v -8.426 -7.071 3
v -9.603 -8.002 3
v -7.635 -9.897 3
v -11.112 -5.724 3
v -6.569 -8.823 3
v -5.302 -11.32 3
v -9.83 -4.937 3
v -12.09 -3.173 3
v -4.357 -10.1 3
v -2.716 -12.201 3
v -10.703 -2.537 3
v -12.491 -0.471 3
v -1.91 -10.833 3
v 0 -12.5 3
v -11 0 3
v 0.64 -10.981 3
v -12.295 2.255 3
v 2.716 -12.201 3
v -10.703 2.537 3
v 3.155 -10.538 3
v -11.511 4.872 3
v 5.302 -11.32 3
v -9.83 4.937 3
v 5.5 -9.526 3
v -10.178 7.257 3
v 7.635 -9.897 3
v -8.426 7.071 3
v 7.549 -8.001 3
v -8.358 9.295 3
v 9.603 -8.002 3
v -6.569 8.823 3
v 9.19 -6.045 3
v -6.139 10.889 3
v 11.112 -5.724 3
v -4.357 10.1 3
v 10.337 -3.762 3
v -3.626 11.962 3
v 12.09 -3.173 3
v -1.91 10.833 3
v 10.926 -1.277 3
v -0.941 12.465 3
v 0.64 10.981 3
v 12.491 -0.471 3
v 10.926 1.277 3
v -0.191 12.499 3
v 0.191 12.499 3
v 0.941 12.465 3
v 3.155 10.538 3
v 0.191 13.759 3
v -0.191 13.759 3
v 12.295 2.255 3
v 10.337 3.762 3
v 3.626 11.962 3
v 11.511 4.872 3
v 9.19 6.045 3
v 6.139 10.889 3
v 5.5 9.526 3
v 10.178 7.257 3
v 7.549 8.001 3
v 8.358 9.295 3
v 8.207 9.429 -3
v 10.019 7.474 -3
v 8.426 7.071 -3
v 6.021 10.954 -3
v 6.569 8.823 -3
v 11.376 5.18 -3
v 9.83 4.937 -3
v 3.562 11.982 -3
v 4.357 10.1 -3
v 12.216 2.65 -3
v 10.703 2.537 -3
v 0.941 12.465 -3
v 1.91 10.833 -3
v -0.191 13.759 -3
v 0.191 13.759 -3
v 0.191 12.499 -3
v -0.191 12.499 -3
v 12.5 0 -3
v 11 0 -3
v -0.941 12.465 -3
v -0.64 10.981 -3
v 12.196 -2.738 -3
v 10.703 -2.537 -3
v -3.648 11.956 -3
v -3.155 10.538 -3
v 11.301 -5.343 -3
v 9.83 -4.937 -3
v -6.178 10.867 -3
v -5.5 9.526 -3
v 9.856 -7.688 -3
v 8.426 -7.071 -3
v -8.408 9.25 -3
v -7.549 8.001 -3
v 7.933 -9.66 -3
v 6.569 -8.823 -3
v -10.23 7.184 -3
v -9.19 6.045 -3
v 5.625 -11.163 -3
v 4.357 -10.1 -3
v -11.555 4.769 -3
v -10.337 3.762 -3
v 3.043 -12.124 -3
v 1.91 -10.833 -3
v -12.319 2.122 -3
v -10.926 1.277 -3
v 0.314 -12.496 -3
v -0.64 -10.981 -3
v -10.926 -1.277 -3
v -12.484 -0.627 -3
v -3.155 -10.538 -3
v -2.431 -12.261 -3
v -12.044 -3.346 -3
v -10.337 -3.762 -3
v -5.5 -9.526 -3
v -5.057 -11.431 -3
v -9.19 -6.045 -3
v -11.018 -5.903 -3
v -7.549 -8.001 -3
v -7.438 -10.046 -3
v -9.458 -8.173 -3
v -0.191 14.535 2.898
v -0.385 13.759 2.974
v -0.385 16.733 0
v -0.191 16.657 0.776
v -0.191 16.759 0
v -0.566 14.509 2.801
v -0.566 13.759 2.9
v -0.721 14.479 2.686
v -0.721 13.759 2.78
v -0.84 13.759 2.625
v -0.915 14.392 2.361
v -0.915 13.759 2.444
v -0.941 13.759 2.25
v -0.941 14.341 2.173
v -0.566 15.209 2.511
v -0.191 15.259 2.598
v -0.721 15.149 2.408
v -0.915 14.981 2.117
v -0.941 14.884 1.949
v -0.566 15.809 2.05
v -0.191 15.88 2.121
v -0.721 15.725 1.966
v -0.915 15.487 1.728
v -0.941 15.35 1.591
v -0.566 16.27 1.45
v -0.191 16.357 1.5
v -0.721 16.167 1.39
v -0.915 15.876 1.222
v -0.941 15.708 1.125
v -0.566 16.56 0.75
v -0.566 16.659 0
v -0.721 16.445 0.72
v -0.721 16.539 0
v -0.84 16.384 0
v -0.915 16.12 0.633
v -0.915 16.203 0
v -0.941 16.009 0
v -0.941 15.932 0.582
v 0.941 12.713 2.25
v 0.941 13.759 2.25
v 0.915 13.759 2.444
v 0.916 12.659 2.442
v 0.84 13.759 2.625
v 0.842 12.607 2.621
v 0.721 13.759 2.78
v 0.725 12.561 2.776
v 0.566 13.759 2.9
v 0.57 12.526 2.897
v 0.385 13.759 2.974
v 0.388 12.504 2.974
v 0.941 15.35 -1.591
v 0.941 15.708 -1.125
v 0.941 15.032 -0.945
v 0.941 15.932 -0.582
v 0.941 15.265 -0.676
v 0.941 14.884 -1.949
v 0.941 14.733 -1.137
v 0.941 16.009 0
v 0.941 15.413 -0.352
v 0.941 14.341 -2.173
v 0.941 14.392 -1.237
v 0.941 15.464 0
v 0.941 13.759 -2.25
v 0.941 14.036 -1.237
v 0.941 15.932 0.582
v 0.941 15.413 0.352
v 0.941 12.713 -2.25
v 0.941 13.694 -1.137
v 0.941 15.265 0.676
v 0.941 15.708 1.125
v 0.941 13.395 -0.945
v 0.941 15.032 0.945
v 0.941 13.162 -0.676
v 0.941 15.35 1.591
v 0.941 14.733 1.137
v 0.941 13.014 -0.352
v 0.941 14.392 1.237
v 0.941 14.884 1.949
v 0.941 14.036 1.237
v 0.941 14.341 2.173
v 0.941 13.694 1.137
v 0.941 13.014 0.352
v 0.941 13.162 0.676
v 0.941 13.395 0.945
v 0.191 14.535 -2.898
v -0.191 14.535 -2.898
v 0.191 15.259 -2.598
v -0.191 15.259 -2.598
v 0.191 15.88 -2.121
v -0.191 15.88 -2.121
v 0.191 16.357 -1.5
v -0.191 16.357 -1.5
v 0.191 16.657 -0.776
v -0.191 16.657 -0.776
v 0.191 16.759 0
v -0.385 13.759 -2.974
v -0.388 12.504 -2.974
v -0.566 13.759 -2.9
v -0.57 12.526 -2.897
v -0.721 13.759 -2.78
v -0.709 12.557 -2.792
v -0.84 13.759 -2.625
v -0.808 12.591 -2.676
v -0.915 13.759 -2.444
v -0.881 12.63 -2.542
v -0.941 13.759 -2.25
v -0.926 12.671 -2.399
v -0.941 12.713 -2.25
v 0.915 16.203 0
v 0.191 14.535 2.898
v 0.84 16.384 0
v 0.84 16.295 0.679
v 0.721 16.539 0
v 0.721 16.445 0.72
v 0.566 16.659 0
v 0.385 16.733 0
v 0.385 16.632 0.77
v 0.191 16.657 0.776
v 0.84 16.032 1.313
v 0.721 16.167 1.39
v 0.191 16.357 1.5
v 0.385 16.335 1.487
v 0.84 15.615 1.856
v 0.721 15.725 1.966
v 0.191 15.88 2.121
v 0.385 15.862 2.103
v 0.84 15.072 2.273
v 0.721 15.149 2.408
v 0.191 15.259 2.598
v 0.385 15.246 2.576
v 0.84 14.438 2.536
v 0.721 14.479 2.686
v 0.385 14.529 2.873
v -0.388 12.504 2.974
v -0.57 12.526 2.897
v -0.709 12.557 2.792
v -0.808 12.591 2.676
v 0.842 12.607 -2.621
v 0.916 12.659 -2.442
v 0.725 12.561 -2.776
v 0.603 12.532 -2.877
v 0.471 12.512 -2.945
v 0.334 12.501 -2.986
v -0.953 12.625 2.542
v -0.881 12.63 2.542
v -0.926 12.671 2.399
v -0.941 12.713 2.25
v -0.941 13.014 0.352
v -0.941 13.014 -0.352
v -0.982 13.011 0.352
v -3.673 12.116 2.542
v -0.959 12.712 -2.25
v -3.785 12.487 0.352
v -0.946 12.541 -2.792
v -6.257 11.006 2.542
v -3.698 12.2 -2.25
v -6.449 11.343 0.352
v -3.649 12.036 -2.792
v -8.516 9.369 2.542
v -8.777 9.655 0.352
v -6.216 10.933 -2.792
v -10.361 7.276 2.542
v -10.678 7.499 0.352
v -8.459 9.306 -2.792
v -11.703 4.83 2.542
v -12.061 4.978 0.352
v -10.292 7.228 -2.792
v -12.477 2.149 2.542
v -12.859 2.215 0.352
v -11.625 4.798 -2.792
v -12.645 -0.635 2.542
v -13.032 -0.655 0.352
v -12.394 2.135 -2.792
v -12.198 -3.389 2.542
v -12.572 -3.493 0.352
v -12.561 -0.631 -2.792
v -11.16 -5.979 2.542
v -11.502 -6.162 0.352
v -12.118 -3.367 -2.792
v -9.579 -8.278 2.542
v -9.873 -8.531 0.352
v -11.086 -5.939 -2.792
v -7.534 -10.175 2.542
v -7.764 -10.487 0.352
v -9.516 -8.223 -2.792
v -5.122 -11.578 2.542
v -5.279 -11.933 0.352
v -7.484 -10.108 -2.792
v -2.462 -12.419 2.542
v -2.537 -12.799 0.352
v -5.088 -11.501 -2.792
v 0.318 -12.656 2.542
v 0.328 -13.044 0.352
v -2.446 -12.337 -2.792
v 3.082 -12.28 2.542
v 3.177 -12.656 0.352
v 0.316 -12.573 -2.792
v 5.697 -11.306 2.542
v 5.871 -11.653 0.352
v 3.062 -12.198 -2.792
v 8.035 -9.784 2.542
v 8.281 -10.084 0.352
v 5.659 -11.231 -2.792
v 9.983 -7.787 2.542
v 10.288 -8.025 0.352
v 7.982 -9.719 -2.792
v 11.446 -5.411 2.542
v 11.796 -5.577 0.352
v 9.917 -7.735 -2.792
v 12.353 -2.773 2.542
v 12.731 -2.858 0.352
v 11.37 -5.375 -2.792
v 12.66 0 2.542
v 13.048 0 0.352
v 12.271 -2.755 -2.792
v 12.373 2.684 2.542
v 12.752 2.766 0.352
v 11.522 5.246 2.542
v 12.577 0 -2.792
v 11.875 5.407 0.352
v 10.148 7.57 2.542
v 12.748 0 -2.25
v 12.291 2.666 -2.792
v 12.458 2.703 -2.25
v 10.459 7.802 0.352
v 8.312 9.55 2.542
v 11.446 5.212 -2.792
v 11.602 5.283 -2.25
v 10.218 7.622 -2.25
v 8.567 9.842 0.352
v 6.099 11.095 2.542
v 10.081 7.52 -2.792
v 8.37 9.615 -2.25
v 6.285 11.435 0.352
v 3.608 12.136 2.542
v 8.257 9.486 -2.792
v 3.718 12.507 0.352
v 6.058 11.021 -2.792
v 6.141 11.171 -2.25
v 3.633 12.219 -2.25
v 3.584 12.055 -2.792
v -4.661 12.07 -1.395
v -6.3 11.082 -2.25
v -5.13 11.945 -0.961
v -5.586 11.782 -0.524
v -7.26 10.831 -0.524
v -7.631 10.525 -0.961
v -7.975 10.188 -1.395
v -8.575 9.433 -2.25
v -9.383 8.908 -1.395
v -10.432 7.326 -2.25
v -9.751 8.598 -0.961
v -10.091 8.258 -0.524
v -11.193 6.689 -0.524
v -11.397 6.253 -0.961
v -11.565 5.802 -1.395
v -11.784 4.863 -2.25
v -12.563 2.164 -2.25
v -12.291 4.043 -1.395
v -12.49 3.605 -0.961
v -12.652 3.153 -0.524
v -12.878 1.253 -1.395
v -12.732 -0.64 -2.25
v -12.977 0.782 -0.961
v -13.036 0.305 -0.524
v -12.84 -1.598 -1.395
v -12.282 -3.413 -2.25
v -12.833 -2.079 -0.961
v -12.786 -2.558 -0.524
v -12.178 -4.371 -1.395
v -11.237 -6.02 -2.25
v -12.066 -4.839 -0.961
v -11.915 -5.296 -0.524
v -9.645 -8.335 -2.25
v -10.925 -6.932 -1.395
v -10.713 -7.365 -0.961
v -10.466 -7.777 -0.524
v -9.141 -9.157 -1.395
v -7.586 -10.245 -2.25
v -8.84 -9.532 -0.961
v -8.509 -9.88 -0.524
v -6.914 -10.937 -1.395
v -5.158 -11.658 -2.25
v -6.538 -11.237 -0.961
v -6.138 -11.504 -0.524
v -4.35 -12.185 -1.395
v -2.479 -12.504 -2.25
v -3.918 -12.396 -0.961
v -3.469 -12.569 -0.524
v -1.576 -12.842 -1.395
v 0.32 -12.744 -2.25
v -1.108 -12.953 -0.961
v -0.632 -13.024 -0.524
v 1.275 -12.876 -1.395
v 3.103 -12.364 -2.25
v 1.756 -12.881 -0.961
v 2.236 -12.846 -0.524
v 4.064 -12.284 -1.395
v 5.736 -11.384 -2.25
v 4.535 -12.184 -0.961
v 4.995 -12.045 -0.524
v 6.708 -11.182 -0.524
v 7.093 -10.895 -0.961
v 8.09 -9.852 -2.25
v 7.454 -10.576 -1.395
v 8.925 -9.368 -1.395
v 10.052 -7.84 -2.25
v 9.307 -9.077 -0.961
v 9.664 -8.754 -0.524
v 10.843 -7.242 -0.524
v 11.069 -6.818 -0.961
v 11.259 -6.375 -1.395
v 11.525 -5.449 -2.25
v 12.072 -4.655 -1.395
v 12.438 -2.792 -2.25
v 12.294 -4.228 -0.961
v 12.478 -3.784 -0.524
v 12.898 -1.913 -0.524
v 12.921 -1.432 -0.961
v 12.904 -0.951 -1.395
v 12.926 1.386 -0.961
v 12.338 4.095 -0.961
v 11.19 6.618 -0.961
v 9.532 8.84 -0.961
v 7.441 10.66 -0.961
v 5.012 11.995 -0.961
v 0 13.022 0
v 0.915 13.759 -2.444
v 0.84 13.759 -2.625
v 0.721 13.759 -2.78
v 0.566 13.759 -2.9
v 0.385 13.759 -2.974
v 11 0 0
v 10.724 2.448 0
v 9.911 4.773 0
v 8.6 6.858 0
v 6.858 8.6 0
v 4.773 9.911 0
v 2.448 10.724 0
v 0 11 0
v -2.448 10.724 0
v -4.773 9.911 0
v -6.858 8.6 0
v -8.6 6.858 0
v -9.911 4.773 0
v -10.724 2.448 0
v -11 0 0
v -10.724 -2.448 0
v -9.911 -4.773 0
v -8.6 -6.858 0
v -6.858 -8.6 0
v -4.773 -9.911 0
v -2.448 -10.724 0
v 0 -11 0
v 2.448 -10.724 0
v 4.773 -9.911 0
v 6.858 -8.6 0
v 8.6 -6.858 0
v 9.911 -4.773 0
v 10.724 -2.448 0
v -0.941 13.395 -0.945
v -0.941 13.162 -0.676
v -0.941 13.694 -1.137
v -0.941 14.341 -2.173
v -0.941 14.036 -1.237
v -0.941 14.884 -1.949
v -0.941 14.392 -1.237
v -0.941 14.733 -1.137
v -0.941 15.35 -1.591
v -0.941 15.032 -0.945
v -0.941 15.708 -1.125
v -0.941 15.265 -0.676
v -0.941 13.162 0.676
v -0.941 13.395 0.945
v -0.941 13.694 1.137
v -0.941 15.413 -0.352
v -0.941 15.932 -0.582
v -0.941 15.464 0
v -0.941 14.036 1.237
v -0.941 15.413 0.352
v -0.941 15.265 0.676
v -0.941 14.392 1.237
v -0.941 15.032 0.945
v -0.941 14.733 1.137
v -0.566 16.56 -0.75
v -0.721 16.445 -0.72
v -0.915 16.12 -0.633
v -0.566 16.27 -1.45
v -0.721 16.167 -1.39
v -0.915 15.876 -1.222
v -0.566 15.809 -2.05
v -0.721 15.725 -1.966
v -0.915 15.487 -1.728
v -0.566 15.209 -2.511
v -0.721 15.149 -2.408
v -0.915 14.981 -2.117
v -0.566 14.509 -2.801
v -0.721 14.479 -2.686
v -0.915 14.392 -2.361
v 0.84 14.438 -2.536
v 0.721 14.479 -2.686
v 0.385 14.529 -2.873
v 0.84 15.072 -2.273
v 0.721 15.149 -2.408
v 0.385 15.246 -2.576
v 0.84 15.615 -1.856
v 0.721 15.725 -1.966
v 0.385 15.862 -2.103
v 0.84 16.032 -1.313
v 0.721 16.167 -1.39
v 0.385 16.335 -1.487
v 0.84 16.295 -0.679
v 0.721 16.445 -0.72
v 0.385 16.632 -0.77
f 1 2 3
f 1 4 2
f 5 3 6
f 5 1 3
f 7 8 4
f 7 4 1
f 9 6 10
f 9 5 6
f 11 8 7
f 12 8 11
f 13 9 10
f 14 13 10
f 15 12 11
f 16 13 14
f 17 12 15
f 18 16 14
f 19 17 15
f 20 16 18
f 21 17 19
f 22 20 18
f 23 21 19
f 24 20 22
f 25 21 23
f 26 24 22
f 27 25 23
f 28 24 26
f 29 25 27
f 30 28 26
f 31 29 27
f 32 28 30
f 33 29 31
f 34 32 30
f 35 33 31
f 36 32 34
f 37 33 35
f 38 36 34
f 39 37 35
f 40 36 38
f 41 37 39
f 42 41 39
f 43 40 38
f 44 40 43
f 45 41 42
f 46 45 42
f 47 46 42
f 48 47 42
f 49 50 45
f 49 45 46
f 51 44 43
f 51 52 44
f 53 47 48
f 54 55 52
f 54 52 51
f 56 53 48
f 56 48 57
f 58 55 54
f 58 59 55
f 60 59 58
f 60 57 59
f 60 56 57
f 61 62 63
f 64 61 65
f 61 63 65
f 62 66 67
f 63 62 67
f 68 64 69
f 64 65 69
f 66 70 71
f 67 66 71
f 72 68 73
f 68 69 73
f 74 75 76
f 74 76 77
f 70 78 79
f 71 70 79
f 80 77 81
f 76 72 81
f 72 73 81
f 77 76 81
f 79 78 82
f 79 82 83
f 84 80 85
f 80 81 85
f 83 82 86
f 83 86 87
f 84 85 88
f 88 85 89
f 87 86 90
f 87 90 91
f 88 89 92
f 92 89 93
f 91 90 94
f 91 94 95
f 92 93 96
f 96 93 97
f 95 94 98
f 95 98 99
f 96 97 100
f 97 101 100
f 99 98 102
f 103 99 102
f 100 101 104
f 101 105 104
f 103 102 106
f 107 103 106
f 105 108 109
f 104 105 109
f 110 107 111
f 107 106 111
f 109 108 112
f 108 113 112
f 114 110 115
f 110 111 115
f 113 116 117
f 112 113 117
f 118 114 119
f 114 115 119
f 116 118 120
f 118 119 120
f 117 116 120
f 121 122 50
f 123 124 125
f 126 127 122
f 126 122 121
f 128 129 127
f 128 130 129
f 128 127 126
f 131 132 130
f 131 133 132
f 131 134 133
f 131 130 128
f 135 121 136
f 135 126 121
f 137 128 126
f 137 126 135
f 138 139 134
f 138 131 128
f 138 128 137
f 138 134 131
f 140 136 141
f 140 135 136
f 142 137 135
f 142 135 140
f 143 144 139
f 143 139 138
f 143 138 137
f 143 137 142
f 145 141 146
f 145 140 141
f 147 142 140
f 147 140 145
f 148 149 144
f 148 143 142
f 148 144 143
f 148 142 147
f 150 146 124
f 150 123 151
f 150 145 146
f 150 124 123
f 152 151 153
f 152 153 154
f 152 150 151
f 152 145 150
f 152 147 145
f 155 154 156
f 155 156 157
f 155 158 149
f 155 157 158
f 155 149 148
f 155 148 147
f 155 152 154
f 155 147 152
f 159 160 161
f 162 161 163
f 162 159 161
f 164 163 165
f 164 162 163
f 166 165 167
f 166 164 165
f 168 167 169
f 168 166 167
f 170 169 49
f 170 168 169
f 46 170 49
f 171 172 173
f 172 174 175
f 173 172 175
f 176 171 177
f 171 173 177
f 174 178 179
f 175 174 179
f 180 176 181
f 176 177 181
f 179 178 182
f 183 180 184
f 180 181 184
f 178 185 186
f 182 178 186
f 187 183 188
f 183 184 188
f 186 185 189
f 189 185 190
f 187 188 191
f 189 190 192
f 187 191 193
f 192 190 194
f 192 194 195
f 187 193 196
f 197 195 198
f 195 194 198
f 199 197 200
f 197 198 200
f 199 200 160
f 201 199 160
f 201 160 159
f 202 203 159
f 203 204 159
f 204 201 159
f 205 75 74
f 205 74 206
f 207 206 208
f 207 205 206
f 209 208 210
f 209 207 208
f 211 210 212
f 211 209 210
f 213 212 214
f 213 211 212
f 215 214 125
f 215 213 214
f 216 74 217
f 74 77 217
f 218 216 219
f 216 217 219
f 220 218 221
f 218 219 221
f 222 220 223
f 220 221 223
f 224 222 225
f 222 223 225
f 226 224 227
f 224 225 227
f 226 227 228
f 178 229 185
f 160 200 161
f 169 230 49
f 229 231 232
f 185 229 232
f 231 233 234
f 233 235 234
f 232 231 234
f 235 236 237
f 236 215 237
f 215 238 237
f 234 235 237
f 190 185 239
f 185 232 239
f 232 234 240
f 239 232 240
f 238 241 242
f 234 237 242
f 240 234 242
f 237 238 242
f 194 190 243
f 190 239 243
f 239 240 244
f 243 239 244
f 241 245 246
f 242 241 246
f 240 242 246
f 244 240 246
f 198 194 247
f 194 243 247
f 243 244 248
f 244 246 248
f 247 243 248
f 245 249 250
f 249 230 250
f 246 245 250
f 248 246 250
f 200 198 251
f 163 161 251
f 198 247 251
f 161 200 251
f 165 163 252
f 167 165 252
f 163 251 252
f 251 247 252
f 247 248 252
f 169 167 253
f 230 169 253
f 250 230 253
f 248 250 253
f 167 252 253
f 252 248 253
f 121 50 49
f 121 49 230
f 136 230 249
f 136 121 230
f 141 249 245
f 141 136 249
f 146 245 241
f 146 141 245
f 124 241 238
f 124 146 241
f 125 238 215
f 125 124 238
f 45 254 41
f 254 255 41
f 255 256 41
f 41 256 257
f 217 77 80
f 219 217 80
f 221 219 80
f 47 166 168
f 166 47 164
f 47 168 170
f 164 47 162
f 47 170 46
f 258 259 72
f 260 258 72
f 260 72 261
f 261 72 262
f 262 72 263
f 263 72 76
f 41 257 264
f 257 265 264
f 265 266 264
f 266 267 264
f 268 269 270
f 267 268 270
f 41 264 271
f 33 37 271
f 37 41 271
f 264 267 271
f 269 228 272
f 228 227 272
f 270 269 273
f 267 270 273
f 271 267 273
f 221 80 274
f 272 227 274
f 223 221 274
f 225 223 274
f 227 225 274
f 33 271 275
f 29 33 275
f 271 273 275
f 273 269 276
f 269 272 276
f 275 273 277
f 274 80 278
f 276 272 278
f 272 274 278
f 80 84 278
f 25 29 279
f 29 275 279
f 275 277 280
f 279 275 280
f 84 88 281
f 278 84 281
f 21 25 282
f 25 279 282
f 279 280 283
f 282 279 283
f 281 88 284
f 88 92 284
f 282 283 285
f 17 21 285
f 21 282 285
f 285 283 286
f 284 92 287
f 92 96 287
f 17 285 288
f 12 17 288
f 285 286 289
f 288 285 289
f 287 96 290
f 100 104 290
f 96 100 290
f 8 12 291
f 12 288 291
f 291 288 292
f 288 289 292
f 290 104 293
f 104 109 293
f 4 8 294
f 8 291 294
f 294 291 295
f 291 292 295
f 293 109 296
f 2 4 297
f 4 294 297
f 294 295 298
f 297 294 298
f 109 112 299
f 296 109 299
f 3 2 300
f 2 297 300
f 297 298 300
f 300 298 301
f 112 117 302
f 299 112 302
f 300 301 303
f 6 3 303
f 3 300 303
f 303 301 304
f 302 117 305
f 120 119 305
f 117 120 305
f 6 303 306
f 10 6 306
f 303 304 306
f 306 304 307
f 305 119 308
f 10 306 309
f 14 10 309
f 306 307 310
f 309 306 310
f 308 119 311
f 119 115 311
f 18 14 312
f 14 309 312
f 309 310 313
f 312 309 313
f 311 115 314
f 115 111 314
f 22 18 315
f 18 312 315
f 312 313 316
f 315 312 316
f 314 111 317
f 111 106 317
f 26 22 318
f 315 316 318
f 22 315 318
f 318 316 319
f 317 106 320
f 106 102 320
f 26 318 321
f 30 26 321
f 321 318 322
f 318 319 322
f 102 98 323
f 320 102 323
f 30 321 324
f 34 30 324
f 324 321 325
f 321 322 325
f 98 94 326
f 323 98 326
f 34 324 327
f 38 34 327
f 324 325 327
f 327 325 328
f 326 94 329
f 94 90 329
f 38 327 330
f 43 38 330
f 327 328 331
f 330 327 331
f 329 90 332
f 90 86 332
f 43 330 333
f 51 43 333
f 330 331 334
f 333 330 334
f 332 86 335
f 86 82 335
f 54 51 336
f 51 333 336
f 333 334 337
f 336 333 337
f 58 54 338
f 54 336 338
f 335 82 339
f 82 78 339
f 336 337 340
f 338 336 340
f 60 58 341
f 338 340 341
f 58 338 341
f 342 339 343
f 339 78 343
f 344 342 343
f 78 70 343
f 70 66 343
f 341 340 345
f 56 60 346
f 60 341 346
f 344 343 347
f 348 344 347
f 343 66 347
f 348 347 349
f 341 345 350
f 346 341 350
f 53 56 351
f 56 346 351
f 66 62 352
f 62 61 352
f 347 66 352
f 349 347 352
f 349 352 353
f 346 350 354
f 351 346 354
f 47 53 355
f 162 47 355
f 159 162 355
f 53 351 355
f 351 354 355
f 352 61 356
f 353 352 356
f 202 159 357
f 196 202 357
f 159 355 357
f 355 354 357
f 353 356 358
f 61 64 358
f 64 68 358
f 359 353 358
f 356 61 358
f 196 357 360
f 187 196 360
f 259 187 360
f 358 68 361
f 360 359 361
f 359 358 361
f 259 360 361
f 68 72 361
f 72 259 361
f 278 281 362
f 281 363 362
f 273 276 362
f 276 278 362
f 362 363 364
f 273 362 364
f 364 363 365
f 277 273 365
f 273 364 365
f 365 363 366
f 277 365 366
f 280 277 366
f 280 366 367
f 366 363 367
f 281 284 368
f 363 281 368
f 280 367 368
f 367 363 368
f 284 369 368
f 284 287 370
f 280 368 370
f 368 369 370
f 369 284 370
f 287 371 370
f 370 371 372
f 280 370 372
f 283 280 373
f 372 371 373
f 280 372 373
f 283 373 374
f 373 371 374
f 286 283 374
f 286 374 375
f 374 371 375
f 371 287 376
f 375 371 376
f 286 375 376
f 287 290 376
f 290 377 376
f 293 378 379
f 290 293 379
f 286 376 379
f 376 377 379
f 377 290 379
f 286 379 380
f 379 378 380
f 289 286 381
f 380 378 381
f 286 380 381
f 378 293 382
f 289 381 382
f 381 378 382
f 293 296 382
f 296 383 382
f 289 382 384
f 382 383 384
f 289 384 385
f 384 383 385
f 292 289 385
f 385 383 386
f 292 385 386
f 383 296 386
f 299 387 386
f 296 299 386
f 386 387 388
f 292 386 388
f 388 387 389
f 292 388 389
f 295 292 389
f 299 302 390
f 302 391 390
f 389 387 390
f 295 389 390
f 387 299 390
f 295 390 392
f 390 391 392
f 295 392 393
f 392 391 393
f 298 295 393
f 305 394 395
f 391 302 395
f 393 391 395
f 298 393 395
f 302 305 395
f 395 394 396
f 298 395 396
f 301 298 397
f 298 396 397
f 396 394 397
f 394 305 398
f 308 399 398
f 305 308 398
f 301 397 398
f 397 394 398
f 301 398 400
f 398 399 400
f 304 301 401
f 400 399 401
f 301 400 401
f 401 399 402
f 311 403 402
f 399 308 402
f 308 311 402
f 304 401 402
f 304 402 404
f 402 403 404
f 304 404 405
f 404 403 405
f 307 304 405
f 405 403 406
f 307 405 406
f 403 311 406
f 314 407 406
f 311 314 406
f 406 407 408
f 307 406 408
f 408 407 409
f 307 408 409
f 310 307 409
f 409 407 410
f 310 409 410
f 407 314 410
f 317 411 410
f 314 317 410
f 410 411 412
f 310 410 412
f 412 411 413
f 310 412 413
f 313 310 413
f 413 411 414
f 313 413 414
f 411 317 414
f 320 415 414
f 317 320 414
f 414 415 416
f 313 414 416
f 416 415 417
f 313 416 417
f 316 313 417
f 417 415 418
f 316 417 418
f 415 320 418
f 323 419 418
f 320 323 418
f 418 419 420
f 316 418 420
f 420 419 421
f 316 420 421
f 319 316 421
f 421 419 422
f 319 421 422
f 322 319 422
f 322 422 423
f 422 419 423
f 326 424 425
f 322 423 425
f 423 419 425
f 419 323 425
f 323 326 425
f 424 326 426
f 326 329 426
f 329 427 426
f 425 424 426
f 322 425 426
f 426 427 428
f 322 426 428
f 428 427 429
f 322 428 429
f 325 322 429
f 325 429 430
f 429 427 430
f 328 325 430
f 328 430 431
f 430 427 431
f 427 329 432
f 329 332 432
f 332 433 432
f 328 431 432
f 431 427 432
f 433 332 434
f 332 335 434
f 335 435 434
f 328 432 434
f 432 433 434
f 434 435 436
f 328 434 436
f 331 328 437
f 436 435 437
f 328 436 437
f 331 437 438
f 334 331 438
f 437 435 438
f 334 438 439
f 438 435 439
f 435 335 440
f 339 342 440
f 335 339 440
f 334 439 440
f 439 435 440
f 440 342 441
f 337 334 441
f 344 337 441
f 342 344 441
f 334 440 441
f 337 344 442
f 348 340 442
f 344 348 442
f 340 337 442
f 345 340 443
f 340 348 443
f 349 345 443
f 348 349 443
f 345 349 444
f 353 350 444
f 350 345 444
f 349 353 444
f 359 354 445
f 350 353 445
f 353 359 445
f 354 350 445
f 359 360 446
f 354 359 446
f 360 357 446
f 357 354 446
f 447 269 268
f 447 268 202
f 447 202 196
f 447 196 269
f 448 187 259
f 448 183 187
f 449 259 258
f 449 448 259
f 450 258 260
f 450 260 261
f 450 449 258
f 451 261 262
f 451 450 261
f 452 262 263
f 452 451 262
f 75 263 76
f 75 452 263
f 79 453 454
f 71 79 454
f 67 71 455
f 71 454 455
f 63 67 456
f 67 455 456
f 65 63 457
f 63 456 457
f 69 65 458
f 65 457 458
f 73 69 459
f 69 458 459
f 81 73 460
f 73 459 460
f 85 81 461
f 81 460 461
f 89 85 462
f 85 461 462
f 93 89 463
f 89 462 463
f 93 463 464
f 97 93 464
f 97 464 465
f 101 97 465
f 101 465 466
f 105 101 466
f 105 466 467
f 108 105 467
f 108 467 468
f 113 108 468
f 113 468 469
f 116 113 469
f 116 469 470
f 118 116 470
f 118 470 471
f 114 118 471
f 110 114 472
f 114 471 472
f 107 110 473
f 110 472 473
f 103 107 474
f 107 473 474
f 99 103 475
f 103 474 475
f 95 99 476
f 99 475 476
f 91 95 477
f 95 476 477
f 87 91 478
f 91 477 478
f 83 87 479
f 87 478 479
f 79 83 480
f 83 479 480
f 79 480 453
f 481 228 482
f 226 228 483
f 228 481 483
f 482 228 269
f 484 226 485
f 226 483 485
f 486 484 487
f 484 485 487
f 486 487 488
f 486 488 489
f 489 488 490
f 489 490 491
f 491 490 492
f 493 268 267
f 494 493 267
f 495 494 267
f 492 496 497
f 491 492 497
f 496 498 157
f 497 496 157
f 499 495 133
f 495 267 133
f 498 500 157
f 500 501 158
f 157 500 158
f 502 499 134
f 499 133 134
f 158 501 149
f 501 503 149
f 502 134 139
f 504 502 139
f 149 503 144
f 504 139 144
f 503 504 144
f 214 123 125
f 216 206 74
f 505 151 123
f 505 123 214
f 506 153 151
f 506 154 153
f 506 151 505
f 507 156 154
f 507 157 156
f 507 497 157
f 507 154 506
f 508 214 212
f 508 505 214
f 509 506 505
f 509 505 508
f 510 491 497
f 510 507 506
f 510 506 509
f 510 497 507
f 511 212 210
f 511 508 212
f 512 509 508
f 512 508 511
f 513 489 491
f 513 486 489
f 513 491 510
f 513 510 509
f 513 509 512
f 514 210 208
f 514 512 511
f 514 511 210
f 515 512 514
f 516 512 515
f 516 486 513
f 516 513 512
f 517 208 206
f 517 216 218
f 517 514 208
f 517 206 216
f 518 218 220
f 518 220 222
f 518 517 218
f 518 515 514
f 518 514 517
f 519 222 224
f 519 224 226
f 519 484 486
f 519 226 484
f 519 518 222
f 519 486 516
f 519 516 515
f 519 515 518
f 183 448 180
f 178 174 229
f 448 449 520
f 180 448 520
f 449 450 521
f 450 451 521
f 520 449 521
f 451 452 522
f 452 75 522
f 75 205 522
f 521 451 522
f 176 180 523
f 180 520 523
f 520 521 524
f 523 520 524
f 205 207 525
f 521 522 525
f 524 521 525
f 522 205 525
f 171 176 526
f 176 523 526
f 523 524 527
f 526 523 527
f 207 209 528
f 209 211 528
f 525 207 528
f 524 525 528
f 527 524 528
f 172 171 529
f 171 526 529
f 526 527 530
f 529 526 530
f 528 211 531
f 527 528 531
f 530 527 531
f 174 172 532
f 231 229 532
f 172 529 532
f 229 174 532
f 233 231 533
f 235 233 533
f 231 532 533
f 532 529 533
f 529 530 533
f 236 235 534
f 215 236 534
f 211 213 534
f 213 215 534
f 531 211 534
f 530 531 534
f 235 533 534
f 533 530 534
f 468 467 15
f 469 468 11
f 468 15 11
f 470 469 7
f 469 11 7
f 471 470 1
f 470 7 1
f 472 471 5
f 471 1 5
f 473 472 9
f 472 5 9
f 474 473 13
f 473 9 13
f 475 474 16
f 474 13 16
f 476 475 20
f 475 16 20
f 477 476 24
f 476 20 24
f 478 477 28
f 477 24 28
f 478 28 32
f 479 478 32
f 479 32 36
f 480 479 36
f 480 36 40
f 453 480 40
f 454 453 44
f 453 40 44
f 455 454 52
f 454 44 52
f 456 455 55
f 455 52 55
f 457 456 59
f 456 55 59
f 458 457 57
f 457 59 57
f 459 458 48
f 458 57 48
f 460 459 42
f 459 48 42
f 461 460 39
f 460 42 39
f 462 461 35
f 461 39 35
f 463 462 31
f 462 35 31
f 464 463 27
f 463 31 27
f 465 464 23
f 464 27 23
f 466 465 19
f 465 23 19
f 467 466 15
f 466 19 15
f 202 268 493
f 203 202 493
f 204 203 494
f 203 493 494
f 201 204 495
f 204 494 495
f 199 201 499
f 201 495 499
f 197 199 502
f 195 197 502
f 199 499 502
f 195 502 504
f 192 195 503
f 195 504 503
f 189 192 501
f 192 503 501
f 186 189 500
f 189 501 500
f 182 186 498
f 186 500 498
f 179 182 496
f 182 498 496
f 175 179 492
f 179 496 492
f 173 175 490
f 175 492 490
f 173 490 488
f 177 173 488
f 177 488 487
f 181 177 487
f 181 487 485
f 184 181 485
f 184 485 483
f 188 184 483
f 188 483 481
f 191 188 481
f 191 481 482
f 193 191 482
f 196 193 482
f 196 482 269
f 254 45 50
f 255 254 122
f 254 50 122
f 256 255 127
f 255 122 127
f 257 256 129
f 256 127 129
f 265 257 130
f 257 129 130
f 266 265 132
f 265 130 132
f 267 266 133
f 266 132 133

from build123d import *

# Parameters (mm, degrees)
F3_DEPTH  = 3
F4_DEPTH  = 3
F5_R      = 2.99999
F6_R      = 0.75
F8_DEPTH  = 2
F9_R      = 11
F10_DEPTH = 25


# Not quite as in the source:
# - a fillet or chamfer is up to 0.001 mm smaller than in the source, because OpenCascade refuses the exact size


with BuildPart() as f1:
    # F0 (on Front) → F1 (revolve)
    with BuildSketch(Plane.XZ):
        with BuildLine():
            Line((-11, 0), (-11, 3))
            Line((-11, 3), (-12.5, 3))
            ThreePointArc((-12.5, 3), (-13.0556042785, 0), (-12.5, -3))
            Line((-12.5, -3), (-11, -3))
            Line((-11, -3), (-11, 0))
        make_face()
    revolve(axis=Axis((0, 0, 1.9247694872), (0, 0, 1)))

    # F2 (on Top) → F3 (join)
    with BuildSketch(Plane.XY):
        with BuildLine():
            Line((0.9405623698, 12.4645634672), (0.9405623698, 16.7590089038))
            Line((0.9405623698, 16.7590089038), (-0.9405623698, 16.7590089038))
            Line((-0.9405623698, 16.7590089038), (-0.9405623698, 12.4645634672))
            ThreePointArc((-0.9405623698, 12.4645634672), (0, 12.5), (0.9405623698, 12.4645634672))
        make_face()
    extrude(amount=F3_DEPTH)

    # F3_face (on face) + F2 (on Top) → F4 (join)
    with BuildSketch(Plane(origin=(0, 14.9016416929, 0), x_dir=(1, 0, 0), z_dir=(0, 0, -1))):
        with BuildLine():
            add(Edge.make_bspline(
                [(-0.9405623698, 1.8799618663), (-0.4710967186, 1.8460521303), (0, 1.8347096394), (0.4710967186, 1.8460521303), (0.9405623698, 1.8799618663)],
                knots=[0, 0, 0, 0, 0, 1, 1, 1, 1, 1], degree=4))
            Line((-0.9405623698, 1.8799618663), (-0.9405623698, -1.8573672109))
            Line((-0.9405623698, -1.8573672109), (0.9405623698, -1.8573672109))
            Line((0.9405623698, -1.8573672109), (0.9405623698, 1.8799618663))
        make_face()
    with BuildSketch(Plane.XY):
        with BuildLine():
            Line((0.9405623698, 12.4645634672), (0.9405623698, 16.7590089038))
            Line((0.9405623698, 16.7590089038), (-0.9405623698, 16.7590089038))
            Line((-0.9405623698, 16.7590089038), (-0.9405623698, 12.4645634672))
            ThreePointArc((-0.9405623698, 12.4645634672), (0, 12.5), (0.9405623698, 12.4645634672))
        make_face()
        with BuildLine():
            ThreePointArc((12.5, 0), (9.1653431366, 8.4997932439), (0.9405623698, 12.4645634672))
            ThreePointArc((0.9405623698, 12.4645634672), (0, 12.5), (-0.9405623698, 12.4645634672))
            ThreePointArc((-0.9405623698, 12.4645634672), (-8.4997932439, -9.1653431366), (12.5, 0))
        make_face()
    extrude(amount=F4_DEPTH, dir=(0, 0, -1))

    # F5 (radius 3 in the source; OpenCascade refuses exactly that, so slightly less here)
    f5_edges = [f1.edges().sort_by_distance(p)[0] for p in [
        (0, 16.759009, 3),
        (0, 16.759009, -3),
    ]]
    fillet(f5_edges, radius=F5_R)

    # F6
    f6_edges = [f1.edges().sort_by_distance(p)[0] for p in [
        (0.940562, 13.111791, -3),
        (0.940562, 15.880332, 2.121323),
        (-0.940562, 15.880332, 2.121323),
        (-0.940562, 13.111791, 3),
        (-0.940562, 13.111791, -3),
    ]]
    fillet(f6_edges, radius=F6_R)

    # F7 (on face) → F8 (cut)
    with BuildSketch(Plane(origin=(-0.9405623698, 0, 0), x_dir=(0, -1, 0), z_dir=(-1, 0, 0))):
        with BuildLine():
            add(Edge.make_bspline(
                [(-13.0142525221, 0.3522206963), (-13.0179655917, 0.2642177815), (-13.0229178327, 0.0881074317), (-13.0229178526, -0.0881075807), (-13.01796564, -0.2642179295), (-13.0142525781, -0.352220887)],
                knots=[0.8851801326, 0.8851801326, 0.8851801326, 0.8851801326, 0.8851801326, 1, 1.1148199242, 1.1148199242, 1.1148199242, 1.1148199242, 1.1148199242], degree=4))
            ThreePointArc((-13.0142525221, 0.3522206963), (-15.4636025882, 9.94e-08), (-13.0142525781, -0.352220887))
        make_face()
    extrude(amount=-F8_DEPTH, mode=Mode.SUBTRACT)

    # F9 (on face) → F10 (cut)
    with BuildSketch(Plane.XY):
        Circle(F9_R)
    extrude(amount=-F10_DEPTH, mode=Mode.SUBTRACT)


solid = f1.part
